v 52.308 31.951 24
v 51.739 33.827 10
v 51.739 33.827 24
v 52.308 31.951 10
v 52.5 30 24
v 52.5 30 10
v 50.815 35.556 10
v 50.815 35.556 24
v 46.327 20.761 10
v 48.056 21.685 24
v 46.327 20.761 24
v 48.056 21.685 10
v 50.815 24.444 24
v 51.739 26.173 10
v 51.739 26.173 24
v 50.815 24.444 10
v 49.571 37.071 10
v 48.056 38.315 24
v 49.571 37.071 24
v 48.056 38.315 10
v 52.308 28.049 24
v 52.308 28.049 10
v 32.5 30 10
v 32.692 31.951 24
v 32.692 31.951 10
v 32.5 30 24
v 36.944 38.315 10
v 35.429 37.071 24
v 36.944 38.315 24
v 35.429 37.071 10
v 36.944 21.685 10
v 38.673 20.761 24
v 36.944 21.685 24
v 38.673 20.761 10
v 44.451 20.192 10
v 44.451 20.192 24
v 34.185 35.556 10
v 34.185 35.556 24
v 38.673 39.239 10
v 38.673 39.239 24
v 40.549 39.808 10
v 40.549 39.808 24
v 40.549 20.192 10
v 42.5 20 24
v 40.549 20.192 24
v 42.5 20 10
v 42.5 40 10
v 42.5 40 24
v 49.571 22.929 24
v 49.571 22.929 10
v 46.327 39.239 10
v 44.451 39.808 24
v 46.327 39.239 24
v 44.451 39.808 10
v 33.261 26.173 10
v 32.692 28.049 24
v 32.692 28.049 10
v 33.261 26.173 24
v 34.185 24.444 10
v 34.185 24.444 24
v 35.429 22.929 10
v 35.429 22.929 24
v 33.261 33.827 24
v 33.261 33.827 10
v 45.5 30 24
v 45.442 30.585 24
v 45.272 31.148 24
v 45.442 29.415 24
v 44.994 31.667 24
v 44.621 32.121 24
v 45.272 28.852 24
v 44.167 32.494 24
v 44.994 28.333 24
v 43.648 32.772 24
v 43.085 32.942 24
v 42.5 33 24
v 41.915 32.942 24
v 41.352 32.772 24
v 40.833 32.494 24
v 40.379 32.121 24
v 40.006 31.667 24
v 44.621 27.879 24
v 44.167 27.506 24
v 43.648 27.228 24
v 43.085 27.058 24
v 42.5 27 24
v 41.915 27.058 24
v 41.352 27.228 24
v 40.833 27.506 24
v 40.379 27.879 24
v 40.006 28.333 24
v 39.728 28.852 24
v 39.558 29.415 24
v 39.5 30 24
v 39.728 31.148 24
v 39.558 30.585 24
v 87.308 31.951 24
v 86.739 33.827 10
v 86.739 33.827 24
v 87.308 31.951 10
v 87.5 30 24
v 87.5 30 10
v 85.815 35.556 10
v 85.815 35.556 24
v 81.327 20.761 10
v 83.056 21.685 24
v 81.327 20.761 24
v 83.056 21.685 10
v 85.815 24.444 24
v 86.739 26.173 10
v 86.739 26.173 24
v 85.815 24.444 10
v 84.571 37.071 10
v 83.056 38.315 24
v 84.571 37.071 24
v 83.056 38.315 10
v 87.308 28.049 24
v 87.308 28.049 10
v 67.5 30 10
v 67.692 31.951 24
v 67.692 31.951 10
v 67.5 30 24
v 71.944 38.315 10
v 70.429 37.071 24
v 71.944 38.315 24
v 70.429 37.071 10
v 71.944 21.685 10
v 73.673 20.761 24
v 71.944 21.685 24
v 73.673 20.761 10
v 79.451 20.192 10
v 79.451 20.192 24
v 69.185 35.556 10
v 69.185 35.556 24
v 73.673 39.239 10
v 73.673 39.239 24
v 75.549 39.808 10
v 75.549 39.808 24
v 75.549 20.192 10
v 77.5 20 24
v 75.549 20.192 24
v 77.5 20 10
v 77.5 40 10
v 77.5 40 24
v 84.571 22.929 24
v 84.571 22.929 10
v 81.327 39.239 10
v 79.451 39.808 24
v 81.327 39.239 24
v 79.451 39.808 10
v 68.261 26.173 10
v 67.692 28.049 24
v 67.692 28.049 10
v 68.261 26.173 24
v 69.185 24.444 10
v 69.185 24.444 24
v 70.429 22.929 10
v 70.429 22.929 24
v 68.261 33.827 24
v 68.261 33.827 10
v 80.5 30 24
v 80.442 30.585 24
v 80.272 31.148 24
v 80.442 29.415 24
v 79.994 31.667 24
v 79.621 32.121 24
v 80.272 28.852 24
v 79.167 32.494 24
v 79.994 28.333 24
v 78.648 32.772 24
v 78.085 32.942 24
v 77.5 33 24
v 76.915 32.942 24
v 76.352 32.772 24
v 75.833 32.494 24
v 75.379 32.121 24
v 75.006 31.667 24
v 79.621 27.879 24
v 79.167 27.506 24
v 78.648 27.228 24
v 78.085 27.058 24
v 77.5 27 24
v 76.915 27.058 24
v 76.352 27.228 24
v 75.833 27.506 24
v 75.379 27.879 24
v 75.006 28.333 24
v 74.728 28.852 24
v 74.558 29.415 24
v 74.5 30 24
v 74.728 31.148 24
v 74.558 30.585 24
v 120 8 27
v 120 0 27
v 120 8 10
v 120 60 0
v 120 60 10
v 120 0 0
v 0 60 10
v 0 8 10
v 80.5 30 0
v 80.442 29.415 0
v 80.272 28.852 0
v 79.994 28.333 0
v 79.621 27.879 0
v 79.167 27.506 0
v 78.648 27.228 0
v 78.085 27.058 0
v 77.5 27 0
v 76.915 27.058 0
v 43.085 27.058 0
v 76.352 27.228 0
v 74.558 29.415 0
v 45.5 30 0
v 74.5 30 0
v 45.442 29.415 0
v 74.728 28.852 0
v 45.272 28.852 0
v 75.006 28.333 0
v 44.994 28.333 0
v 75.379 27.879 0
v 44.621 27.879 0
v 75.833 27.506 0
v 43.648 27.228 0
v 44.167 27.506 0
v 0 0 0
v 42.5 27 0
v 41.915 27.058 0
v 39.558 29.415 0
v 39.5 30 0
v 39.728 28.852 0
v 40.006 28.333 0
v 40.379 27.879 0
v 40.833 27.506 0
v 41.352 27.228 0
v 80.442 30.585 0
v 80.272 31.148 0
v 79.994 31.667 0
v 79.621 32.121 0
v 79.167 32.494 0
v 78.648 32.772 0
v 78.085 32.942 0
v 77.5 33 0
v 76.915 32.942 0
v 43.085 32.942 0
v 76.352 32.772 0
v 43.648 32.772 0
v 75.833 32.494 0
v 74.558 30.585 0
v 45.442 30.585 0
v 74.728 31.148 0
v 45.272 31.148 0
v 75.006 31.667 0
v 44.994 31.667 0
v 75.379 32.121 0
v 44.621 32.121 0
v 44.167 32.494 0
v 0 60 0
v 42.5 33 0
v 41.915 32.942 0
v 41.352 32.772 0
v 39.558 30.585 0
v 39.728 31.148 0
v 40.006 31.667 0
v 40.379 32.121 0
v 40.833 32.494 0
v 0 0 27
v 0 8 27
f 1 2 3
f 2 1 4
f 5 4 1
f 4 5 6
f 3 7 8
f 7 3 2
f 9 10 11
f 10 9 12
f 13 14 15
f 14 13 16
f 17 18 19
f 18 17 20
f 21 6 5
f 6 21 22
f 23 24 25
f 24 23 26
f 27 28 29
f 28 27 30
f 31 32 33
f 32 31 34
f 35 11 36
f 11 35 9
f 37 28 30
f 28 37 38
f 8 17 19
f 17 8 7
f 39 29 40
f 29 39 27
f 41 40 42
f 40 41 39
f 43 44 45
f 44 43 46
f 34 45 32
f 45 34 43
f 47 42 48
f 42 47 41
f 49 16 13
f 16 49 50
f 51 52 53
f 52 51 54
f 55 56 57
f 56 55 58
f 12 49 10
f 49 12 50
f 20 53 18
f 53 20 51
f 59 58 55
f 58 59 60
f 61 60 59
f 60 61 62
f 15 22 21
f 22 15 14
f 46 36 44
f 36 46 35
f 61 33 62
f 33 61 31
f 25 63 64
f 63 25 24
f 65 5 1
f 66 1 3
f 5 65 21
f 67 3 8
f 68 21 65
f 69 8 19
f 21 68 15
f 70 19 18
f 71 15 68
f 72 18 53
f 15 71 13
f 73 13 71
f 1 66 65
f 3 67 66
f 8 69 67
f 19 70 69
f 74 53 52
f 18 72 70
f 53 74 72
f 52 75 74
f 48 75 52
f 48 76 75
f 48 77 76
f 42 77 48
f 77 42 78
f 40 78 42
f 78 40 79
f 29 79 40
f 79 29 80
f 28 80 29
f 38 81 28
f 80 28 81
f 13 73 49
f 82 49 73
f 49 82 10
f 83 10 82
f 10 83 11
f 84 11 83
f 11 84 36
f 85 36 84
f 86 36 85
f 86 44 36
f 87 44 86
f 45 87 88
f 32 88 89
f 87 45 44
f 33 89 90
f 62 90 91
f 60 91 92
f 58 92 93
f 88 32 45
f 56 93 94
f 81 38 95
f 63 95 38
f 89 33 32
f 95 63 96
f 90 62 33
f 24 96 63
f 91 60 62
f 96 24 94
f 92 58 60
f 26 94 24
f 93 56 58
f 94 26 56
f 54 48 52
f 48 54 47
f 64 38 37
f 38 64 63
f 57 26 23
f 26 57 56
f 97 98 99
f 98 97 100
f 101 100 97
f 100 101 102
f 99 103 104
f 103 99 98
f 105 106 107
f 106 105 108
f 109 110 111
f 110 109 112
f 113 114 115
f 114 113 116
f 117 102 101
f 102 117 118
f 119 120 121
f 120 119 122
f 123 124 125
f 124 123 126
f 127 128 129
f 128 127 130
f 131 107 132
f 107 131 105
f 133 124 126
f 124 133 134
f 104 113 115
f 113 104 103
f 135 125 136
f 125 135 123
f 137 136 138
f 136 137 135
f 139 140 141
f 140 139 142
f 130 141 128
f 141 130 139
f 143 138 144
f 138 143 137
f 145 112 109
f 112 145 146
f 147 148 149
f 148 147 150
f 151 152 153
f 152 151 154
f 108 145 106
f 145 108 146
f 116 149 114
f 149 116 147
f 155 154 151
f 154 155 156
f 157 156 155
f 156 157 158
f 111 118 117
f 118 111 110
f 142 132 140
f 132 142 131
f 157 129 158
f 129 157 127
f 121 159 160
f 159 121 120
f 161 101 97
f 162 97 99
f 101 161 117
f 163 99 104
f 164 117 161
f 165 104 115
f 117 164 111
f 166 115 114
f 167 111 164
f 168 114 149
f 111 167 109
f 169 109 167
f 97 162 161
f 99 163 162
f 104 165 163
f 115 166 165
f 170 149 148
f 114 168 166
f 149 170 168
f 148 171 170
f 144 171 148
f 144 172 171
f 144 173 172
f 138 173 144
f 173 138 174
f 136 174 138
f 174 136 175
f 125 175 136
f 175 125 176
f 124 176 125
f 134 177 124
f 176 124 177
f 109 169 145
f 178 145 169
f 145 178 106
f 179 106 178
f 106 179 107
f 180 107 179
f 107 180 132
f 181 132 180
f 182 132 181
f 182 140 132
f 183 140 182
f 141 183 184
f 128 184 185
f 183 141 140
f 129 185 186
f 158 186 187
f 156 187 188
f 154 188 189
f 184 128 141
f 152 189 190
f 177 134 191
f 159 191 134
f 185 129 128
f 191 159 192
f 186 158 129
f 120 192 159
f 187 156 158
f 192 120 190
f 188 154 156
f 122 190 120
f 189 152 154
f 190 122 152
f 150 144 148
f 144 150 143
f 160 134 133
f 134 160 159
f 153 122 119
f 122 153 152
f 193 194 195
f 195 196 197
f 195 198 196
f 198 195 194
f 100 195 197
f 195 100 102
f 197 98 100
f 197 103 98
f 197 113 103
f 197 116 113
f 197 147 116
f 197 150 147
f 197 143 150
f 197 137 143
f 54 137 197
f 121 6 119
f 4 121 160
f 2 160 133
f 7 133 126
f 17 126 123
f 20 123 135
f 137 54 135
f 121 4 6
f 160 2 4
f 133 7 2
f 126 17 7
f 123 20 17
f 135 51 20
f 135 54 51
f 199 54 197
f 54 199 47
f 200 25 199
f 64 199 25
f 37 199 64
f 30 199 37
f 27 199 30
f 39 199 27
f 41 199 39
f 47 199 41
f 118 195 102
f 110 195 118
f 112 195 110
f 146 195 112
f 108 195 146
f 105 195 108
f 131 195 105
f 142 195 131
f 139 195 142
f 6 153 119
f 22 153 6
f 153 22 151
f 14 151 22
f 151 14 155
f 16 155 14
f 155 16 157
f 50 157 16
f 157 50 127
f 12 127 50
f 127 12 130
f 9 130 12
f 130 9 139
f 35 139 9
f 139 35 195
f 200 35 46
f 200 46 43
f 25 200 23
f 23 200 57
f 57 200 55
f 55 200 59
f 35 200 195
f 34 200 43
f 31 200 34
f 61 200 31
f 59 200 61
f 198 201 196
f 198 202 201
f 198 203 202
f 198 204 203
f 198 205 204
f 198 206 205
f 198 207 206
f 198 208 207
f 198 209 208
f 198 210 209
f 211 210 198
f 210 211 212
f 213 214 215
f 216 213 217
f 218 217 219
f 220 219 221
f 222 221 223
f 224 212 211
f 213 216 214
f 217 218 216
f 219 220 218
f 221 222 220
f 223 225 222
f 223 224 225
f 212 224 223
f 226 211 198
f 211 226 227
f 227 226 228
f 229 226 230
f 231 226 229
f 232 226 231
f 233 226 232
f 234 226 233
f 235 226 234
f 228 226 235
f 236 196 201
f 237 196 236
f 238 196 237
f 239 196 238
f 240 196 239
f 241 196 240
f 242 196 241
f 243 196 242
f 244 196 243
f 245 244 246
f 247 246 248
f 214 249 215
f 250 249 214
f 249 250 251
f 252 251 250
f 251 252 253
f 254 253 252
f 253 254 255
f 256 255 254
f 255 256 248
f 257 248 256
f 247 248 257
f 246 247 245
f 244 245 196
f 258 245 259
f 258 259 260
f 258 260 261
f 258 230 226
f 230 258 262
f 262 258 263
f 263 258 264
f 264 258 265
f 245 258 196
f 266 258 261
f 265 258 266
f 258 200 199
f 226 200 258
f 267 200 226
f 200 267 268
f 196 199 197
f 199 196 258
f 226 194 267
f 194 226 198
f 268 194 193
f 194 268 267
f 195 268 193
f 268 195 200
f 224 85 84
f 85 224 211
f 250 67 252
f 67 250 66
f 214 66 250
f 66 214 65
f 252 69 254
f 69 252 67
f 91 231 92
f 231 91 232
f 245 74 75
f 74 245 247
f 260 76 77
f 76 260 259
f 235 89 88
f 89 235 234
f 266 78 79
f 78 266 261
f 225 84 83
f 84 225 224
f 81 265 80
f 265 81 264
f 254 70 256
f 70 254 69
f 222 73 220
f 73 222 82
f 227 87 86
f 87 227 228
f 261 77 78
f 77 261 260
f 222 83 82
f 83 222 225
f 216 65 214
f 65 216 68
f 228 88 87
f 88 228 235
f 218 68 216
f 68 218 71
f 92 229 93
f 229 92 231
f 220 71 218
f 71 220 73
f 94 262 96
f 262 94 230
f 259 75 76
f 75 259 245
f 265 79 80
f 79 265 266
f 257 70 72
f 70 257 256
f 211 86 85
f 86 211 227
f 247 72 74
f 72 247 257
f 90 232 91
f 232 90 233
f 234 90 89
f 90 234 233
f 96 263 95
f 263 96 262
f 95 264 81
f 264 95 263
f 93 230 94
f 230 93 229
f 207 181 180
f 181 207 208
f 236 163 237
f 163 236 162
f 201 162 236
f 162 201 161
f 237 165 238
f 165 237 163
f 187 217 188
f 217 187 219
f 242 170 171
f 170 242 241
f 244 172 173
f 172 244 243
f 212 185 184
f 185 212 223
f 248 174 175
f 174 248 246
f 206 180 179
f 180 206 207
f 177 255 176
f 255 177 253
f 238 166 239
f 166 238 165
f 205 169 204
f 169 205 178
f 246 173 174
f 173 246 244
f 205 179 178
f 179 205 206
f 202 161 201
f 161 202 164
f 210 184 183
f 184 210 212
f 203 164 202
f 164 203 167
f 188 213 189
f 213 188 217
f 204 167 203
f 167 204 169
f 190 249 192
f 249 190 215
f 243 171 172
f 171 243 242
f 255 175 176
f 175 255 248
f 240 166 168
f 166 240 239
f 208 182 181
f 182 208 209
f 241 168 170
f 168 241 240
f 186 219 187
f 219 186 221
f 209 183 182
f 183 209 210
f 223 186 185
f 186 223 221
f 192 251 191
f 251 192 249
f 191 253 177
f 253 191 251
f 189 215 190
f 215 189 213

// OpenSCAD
$fn = 32;

// ----------------------------------------------------------------------
// Drill jig: fence jig
// ----------------------------------------------------------------------

// --- parameters (mm) ---
plate_l = 120;            // plate length, X
plate_w = 60;             // plate width, Y
plate_t = 10;             // plate thickness
boss_d = 20;              // guide boss diameter
boss_h = 15;              // boss height above the plate
guide_d = 6;              // guide hole diameter
boss_pitch = 35;          // boss pitch
fence_h = 18;             // fence height above the plate
fence_t = 8;              // fence thickness

n_boss = 2;  // guide bosses
boss_x0 = (plate_l - (n_boss - 1) * boss_pitch) / 2;  // first boss X
boss_top = plate_t - 1 + boss_h;  // boss crown height
fence_top = plate_t - 1 + fence_h;  // fence crown height
total_h = max([fence_top, boss_top]);  // overall height

difference() {
  union() {
  cube([plate_l, plate_w, plate_t]);
  for (i = [0 : n_boss - 1])
    translate([boss_x0 + i * boss_pitch, plate_w / 2, plate_t - 1])
      cylinder(h = boss_h, d = boss_d);
  translate([0, 0, plate_t - 1]) cube([plate_l, fence_t, fence_h]);
  }
  for (i = [0 : n_boss - 1])
    translate([boss_x0 + i * boss_pitch, plate_w / 2, -1])
      cylinder(h = plate_t + boss_h, d = guide_d);
}
